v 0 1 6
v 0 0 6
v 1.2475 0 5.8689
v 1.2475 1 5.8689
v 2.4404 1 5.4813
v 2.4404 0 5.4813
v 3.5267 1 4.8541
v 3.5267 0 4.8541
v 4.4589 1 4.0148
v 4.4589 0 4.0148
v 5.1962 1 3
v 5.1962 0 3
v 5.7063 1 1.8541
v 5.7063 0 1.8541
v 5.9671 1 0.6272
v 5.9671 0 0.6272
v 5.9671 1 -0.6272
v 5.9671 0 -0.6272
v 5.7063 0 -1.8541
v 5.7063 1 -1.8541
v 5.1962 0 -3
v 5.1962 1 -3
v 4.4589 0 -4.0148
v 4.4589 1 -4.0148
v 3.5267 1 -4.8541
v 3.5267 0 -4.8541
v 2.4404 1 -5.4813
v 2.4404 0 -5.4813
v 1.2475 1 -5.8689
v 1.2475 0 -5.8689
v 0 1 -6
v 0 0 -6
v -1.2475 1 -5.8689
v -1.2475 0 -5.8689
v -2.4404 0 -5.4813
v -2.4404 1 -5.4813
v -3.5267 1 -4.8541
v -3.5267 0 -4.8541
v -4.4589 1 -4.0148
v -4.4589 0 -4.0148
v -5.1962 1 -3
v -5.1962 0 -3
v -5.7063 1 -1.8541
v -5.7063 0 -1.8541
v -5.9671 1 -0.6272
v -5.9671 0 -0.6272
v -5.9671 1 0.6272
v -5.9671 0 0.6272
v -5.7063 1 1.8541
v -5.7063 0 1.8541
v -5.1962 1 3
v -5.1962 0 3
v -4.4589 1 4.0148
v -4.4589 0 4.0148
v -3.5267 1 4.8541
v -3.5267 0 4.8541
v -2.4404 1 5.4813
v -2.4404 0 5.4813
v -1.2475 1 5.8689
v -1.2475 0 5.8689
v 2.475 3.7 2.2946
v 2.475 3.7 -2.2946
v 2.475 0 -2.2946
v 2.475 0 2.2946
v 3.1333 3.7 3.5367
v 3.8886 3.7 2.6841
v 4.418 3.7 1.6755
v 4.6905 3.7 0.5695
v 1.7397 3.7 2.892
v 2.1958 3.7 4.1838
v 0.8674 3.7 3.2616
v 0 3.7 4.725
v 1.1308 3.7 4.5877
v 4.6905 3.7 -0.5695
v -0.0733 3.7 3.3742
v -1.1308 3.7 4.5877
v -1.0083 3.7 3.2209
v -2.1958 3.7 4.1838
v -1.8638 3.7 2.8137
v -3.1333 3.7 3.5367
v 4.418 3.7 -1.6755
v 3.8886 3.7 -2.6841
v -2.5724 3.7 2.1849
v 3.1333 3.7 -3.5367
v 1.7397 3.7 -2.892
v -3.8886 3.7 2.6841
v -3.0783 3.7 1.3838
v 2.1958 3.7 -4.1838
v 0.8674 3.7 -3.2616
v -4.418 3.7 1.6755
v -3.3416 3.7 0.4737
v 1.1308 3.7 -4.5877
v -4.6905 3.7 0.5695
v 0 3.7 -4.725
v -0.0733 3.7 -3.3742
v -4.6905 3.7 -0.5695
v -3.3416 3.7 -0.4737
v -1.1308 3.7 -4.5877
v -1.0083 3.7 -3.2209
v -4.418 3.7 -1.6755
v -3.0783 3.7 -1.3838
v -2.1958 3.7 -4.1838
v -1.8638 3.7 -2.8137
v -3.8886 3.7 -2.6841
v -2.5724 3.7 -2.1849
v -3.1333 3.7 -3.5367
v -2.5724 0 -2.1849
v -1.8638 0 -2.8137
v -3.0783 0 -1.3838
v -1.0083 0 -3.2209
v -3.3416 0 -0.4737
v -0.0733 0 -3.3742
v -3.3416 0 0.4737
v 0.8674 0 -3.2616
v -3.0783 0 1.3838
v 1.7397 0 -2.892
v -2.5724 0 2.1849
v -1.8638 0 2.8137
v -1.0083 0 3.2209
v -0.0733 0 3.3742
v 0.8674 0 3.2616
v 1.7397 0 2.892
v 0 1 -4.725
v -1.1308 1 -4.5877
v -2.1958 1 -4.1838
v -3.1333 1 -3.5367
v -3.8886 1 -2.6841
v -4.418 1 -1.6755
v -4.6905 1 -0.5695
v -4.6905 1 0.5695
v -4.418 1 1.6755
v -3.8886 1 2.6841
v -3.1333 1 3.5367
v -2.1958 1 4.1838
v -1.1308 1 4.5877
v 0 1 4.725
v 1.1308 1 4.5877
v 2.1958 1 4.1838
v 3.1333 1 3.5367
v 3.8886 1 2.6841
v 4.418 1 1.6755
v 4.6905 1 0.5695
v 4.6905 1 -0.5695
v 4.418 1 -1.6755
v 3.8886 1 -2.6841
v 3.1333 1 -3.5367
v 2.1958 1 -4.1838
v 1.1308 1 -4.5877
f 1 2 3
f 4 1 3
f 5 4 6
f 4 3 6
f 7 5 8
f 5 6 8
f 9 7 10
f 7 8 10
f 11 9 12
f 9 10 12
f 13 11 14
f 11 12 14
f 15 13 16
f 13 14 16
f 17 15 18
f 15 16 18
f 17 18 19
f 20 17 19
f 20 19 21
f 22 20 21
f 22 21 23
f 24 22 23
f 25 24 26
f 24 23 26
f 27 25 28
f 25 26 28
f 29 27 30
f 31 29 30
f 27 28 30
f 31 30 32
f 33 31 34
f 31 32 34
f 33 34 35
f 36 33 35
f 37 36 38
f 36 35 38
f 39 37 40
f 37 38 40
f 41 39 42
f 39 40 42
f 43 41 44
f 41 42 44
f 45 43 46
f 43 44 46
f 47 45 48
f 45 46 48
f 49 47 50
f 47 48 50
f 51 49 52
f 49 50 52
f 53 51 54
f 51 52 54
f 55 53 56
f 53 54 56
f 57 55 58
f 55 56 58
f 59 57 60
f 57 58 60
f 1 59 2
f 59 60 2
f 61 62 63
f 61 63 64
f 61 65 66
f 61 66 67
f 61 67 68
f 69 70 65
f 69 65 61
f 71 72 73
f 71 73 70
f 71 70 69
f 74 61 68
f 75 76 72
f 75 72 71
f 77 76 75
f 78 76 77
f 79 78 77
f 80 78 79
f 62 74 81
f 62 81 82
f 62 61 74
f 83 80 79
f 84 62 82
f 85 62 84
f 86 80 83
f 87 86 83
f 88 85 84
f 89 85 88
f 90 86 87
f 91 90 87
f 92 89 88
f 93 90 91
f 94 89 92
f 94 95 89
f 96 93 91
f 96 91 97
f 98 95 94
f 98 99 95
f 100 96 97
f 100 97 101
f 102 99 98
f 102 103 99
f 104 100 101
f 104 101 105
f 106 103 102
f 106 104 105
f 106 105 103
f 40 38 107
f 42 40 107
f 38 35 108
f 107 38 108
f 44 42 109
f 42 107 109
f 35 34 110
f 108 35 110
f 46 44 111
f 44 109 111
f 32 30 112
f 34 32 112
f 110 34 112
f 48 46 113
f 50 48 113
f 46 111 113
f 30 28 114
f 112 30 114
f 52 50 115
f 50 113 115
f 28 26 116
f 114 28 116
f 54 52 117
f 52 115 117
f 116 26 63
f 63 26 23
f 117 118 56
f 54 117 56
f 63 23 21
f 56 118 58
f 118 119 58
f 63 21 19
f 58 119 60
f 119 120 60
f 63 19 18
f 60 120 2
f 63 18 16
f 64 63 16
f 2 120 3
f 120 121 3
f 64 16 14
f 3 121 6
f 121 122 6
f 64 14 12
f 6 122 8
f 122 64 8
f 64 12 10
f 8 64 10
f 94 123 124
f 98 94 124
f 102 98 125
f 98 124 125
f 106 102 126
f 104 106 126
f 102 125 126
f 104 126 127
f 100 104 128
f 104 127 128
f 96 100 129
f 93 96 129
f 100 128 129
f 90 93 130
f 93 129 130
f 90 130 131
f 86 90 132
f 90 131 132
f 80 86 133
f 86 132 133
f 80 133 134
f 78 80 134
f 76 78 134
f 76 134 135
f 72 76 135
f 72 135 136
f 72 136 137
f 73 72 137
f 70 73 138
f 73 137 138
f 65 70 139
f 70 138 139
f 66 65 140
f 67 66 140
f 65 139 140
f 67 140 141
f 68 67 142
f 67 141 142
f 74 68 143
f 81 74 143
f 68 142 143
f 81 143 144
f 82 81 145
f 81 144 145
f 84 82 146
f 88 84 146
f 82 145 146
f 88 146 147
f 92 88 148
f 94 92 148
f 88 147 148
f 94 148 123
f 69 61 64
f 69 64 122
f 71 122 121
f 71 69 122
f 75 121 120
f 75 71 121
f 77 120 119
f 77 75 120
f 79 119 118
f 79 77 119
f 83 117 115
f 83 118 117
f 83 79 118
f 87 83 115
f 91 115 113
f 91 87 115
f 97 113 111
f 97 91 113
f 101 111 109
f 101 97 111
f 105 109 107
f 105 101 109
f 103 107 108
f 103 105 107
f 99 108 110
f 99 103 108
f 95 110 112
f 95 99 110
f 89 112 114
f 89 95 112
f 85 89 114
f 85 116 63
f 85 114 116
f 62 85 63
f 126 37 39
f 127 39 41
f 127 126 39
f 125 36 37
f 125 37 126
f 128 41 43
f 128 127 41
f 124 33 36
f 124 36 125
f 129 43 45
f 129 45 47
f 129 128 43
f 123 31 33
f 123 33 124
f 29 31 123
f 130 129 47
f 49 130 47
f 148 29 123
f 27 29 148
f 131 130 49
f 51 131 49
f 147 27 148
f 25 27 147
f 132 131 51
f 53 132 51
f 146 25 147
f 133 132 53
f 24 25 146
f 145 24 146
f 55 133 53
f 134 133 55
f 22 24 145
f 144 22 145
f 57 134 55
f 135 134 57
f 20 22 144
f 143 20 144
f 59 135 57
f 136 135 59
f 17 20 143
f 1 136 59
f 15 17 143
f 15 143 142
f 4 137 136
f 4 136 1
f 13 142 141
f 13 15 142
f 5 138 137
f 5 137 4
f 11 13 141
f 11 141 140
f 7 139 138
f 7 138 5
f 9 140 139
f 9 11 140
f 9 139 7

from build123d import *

# Parameters (mm, degrees)
SKETCH1_R           = 6
BOSS_EXTRUDE1_DEPTH = 1
SKETCH2_R           = 4.725
BOSS_EXTRUDE2_DEPTH = 2.7
CUT_EXTRUDE1_DEPTH  = 10.256889326


with BuildPart() as part:
    # Sketch1 → Boss-Extrude1 (new body)
    with BuildSketch(Plane(origin=(0, 0, 0), x_dir=(1, 0, 0), z_dir=(0, 1, 0))):
        with Locations(Location((0, 0, 0), (0, 0, 270))):
            Circle(SKETCH1_R)
    extrude(amount=BOSS_EXTRUDE1_DEPTH)

    # Sketch2 → Boss-Extrude2 (add)
    with BuildSketch(Plane(origin=(0, 1, 0), x_dir=(1, 0, 0), z_dir=(0, 1, 0))):
        with Locations(Location((0, 0, 0), (0, 0, 90))):
            Circle(SKETCH2_R)
    extrude(amount=BOSS_EXTRUDE2_DEPTH)

    # Sketch3 → Cut-Extrude1 (cut, through all)
    with BuildSketch(Plane(origin=(0, 3.7, 0), x_dir=(1, 0, 0), z_dir=(0, 1, 0))):
        with BuildLine():
            Line((2.475, 2.294558781), (2.475, -2.294558781))
            ThreePointArc((2.475, -2.294558781), (-3.375, 0), (2.475, 2.294558781))
        make_face()
    extrude(amount=-CUT_EXTRUDE1_DEPTH, mode=Mode.SUBTRACT)


solid = part.part
